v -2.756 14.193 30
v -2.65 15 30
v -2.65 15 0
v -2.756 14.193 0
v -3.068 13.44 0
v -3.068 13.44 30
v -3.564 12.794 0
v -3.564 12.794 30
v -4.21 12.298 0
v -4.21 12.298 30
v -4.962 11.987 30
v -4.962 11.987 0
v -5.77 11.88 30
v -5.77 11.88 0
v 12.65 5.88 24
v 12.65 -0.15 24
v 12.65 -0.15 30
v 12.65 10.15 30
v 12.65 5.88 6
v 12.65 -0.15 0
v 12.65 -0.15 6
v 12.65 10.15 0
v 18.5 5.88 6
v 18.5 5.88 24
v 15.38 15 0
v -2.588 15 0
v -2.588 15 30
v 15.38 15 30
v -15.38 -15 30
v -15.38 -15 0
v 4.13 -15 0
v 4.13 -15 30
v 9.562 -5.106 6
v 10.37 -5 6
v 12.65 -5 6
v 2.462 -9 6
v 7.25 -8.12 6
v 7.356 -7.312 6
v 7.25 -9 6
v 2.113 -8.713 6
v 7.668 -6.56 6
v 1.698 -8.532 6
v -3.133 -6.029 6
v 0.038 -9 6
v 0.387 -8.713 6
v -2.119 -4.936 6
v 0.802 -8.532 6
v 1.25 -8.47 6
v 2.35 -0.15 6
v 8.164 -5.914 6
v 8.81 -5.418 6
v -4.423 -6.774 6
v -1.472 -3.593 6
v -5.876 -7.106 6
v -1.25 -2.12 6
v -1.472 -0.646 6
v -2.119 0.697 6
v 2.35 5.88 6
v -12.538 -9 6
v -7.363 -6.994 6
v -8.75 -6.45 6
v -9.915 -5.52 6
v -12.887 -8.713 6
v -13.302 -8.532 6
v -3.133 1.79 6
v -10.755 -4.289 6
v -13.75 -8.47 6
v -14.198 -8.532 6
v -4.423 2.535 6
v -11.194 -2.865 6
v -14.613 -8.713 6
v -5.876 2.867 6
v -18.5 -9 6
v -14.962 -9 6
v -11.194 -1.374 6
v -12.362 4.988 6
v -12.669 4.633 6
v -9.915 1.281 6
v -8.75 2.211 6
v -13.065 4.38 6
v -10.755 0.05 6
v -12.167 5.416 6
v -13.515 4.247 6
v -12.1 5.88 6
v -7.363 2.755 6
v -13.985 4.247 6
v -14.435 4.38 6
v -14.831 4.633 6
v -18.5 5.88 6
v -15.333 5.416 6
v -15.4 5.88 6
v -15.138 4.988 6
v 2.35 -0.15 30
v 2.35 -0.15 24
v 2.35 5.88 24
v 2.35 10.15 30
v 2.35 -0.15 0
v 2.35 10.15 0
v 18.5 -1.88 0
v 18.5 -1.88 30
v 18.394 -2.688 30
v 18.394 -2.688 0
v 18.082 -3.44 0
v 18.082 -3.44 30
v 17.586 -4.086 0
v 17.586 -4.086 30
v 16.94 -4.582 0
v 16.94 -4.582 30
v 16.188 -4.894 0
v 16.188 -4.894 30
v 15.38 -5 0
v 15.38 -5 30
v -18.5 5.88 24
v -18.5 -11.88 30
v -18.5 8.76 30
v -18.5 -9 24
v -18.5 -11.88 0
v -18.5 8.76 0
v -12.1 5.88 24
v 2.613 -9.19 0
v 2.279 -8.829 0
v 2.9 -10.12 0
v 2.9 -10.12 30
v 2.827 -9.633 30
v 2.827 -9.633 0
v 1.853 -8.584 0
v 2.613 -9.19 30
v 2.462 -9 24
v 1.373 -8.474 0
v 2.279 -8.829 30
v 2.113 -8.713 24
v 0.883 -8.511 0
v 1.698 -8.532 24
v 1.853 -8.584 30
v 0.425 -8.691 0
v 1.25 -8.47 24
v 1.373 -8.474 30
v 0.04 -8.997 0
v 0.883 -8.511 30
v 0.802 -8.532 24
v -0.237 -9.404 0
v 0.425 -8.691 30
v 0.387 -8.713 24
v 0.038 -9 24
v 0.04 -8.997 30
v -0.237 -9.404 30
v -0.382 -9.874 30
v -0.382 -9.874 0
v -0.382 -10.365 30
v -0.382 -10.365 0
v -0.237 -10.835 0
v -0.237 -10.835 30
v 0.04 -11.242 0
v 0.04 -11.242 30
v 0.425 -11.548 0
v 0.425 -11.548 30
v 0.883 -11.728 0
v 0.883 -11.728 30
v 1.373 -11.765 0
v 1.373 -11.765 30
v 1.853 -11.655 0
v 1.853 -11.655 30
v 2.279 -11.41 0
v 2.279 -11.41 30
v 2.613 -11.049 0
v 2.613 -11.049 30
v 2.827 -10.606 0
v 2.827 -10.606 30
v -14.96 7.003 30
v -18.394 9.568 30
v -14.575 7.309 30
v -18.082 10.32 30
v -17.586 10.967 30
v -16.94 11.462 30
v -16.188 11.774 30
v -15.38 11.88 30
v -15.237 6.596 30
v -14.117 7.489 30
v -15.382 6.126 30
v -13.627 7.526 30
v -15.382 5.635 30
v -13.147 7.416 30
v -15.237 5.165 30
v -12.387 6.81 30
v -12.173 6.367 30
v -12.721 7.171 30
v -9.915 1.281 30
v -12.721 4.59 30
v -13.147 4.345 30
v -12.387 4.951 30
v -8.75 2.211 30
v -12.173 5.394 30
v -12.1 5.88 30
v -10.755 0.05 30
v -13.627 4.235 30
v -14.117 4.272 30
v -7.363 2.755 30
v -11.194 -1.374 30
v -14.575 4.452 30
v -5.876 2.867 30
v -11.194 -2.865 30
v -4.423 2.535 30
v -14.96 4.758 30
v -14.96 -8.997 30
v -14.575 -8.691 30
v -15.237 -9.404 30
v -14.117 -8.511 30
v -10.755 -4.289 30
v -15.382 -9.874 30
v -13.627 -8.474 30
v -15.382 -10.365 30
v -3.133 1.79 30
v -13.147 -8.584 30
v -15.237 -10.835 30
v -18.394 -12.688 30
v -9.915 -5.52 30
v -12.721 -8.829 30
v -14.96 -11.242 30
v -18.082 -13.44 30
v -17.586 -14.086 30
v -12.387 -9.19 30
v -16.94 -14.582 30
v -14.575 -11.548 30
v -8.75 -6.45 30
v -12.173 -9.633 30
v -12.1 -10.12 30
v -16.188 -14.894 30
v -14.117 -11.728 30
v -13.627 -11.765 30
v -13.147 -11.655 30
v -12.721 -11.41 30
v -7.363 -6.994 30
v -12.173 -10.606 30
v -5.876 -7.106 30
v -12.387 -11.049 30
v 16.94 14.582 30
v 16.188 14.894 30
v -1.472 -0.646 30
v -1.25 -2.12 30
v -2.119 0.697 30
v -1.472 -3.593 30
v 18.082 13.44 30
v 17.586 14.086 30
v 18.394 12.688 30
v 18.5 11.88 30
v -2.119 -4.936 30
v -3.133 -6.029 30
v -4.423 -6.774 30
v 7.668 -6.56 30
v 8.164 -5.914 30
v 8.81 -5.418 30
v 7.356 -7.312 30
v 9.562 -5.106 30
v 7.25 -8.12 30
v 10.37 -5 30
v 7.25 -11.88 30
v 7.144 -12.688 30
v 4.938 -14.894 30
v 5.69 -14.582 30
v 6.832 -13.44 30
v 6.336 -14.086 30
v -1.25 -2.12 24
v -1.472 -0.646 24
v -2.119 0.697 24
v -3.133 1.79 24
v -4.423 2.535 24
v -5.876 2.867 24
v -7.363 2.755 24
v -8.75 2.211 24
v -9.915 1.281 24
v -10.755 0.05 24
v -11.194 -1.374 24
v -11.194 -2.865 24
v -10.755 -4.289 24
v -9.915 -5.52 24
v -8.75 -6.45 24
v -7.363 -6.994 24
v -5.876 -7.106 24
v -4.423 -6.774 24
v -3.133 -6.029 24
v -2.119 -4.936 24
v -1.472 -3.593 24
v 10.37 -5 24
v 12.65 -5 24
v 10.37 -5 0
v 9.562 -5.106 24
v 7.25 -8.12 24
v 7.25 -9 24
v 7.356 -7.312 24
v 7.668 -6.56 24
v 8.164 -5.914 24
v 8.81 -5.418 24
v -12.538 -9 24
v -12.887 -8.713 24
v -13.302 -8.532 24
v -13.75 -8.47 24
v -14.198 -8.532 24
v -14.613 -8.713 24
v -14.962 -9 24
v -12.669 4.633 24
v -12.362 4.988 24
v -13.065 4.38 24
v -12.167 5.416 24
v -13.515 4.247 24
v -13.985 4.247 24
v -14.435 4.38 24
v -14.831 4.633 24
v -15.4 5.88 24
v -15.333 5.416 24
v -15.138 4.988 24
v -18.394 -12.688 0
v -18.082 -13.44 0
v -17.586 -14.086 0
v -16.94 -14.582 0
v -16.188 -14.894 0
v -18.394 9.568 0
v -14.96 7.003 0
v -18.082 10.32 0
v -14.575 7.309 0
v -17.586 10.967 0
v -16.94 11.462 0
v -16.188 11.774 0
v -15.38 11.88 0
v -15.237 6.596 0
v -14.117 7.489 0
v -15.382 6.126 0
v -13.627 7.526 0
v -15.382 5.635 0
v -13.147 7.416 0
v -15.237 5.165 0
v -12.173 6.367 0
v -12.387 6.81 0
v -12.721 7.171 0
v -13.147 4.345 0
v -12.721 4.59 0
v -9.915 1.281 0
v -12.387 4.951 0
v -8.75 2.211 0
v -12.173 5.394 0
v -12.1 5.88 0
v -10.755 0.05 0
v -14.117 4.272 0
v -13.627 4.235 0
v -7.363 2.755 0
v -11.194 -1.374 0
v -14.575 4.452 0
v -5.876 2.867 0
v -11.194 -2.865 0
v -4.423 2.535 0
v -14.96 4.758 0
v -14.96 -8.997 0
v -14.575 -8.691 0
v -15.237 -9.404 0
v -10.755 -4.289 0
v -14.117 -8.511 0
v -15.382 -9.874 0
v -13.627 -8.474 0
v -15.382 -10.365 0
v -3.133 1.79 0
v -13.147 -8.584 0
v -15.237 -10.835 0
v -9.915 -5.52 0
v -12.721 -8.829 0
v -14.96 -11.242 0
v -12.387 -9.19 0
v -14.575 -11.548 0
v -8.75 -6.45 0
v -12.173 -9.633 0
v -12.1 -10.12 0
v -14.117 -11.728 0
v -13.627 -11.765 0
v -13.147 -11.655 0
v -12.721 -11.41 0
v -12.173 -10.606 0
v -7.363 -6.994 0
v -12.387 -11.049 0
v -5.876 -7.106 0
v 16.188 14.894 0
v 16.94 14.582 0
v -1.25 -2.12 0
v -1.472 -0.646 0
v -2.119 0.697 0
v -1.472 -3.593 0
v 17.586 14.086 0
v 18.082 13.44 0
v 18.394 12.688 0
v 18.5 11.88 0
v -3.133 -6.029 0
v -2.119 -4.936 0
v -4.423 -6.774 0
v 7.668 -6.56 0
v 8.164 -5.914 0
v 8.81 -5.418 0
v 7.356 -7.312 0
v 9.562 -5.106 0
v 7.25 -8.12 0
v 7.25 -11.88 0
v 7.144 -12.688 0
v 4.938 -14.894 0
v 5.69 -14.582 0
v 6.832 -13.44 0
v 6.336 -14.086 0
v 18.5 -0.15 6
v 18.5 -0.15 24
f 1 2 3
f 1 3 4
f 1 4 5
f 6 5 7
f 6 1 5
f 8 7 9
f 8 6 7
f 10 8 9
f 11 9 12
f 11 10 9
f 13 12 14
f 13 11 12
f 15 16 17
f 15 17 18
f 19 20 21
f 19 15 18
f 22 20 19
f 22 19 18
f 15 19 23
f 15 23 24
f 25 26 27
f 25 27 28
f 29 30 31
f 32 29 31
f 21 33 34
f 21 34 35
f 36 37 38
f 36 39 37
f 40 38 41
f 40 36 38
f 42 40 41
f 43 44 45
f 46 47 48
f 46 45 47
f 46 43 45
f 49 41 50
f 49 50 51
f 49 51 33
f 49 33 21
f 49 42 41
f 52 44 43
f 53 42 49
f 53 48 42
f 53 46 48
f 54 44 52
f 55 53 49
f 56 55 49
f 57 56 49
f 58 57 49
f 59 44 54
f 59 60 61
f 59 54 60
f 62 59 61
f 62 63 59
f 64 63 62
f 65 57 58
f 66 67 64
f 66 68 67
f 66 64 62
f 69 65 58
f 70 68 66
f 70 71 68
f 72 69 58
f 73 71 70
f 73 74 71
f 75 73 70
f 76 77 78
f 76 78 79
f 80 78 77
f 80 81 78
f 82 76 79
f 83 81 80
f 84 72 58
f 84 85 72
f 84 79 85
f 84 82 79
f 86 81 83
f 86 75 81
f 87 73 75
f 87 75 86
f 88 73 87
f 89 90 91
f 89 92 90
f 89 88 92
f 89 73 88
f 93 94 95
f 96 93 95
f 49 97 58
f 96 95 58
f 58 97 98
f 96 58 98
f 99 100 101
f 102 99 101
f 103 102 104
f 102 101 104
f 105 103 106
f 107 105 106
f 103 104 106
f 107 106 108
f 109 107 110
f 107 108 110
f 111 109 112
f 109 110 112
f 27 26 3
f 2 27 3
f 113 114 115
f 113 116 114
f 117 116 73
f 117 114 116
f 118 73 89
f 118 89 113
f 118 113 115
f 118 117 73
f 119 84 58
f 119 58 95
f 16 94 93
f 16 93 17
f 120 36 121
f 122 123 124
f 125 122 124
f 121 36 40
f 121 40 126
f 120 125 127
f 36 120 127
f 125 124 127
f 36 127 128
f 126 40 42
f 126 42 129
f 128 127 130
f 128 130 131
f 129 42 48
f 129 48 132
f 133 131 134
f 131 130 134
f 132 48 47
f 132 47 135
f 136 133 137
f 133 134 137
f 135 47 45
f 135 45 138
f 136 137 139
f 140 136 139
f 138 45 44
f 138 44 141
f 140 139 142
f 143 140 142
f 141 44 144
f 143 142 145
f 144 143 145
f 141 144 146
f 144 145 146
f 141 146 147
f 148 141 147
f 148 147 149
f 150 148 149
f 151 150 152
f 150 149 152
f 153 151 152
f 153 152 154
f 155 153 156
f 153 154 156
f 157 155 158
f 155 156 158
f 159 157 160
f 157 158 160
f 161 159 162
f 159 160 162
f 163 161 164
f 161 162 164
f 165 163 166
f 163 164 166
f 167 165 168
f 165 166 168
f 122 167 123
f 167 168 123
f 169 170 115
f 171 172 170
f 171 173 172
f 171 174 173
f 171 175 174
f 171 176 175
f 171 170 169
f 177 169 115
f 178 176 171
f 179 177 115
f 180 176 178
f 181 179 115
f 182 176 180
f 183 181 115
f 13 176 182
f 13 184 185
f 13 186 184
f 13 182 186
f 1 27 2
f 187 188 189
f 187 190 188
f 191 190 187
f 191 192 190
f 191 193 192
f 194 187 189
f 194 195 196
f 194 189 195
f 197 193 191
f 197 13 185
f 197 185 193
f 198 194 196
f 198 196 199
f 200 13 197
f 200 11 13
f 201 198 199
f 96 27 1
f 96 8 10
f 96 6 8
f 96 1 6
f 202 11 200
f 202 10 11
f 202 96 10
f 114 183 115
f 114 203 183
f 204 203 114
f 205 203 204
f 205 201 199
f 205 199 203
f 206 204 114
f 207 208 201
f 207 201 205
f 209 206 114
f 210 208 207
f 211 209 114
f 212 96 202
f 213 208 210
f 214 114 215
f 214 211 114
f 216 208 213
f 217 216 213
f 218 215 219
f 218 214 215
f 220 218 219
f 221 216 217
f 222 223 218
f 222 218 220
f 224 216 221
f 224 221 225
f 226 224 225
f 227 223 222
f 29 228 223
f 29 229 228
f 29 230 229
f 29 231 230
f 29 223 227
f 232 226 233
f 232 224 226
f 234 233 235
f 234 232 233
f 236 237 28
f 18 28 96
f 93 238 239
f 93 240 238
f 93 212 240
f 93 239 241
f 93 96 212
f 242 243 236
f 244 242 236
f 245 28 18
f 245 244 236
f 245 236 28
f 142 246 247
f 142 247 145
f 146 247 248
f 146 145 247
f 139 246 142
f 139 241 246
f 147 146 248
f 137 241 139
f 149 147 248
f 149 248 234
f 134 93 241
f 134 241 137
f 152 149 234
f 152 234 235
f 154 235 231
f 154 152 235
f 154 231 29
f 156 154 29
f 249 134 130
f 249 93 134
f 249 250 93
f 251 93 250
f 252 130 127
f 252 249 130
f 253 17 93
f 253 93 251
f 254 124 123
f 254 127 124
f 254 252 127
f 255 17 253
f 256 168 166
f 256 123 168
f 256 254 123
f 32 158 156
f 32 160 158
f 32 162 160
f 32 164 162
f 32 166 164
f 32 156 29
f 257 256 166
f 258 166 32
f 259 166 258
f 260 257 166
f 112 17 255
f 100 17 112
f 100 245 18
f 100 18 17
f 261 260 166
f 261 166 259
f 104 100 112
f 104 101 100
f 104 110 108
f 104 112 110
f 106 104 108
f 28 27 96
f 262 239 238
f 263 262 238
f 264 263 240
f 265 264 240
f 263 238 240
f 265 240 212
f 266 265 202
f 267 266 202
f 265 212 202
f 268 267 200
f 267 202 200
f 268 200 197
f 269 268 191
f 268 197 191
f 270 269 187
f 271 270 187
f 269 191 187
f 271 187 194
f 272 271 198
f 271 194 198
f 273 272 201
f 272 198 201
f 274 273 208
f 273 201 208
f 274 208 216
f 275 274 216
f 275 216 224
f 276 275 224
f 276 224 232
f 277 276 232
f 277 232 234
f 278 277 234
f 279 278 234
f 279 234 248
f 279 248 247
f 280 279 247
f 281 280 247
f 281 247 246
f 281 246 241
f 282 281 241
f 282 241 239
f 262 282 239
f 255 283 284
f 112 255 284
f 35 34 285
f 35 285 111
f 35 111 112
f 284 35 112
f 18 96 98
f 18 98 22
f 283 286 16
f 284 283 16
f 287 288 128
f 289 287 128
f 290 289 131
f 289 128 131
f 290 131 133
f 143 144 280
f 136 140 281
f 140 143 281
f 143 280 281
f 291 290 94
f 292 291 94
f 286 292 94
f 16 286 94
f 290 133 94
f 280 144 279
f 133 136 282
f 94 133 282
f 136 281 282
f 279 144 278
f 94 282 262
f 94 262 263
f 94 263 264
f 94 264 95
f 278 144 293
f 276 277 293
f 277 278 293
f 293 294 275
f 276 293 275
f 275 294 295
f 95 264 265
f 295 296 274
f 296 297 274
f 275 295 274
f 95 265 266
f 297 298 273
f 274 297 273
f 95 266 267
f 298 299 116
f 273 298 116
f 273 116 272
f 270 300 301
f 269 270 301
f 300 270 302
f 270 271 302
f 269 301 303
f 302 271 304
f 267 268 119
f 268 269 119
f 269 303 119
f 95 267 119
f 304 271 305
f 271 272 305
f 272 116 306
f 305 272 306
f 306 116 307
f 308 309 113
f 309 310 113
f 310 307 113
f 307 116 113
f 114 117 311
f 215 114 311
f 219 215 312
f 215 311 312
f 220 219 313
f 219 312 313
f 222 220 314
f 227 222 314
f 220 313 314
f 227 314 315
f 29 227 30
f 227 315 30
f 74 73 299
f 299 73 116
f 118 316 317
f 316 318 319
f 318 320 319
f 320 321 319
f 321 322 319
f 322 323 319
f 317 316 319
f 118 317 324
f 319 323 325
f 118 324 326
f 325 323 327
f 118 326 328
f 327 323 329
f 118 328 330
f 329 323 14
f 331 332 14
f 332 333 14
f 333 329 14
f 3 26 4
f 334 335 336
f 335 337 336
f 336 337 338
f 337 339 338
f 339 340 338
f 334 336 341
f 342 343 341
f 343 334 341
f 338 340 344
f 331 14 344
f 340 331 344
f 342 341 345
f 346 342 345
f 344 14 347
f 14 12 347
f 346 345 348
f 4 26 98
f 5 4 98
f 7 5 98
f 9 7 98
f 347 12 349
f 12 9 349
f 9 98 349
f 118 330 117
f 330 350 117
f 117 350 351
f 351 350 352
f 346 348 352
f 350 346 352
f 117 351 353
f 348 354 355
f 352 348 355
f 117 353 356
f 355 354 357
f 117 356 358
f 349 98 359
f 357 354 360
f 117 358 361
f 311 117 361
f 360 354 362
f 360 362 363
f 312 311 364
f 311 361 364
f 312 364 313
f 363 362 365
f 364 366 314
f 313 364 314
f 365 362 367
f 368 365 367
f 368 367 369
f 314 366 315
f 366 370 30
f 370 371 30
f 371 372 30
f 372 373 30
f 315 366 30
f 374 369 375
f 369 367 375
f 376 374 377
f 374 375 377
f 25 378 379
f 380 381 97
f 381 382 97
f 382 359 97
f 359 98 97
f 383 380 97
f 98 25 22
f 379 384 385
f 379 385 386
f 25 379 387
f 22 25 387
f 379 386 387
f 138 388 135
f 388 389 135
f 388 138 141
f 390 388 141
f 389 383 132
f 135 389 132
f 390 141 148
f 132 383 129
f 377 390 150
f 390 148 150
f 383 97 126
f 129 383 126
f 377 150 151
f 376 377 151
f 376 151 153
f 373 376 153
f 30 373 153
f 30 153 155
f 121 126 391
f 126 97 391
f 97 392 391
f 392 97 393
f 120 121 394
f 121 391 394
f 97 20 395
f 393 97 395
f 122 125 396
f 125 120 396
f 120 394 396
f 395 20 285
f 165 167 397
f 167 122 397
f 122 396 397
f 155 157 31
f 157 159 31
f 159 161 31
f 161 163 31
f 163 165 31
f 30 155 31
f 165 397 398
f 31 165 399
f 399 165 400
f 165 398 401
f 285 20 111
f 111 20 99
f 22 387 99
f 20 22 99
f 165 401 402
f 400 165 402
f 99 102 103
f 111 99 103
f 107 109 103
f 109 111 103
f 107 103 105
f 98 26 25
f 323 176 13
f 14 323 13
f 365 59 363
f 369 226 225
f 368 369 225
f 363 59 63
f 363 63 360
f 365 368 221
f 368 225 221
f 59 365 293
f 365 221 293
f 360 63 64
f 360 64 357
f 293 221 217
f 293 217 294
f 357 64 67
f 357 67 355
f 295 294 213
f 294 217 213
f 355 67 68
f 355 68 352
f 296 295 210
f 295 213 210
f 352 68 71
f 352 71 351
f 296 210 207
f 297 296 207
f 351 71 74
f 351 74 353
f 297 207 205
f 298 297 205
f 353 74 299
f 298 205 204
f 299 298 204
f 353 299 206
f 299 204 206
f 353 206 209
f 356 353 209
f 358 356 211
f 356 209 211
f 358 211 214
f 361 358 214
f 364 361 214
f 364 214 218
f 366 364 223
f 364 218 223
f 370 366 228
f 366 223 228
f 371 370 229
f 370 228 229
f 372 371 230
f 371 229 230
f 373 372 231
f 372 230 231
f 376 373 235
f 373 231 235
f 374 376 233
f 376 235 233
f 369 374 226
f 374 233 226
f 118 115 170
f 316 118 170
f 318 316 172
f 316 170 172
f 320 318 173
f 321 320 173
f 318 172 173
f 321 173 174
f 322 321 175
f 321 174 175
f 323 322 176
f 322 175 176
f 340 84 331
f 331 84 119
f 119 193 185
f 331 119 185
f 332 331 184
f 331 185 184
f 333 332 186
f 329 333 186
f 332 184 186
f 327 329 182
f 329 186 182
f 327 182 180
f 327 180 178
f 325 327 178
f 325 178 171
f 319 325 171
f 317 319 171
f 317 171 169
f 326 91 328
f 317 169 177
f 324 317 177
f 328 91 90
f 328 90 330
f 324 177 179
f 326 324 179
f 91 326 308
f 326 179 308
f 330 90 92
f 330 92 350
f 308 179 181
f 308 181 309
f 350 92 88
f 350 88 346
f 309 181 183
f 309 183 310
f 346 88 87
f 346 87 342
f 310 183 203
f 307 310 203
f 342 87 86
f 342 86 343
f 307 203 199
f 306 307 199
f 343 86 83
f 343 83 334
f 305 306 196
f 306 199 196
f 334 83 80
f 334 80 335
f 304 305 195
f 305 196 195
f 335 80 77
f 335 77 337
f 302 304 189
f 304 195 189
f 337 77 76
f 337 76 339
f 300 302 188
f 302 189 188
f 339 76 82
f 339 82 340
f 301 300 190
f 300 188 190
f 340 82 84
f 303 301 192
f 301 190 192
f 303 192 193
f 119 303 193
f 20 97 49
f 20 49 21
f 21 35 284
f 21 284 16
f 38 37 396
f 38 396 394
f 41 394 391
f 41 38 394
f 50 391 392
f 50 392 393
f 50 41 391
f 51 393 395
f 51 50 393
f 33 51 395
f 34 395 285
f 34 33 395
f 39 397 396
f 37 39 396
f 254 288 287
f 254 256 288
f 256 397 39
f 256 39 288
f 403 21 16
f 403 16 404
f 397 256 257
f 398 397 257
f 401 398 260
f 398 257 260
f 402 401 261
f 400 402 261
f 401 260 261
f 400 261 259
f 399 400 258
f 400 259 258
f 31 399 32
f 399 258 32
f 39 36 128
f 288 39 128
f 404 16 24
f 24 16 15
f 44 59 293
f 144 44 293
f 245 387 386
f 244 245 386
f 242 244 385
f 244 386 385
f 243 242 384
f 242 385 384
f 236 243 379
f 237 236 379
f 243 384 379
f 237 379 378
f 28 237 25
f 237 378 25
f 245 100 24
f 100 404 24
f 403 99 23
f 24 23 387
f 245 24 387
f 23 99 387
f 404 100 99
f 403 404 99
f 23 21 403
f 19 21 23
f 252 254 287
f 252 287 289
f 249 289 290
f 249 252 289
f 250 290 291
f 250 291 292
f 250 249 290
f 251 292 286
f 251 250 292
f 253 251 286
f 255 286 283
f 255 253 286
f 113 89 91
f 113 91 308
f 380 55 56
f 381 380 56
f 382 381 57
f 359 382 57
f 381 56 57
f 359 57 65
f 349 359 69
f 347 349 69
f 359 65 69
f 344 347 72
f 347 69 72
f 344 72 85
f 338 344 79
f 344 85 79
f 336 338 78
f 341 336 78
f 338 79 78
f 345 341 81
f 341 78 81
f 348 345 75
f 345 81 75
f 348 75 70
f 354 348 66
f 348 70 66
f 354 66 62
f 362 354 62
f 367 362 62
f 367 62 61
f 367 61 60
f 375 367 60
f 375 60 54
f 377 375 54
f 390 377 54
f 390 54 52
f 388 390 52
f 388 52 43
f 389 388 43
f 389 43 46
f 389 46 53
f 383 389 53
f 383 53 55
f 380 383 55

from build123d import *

# Parameters (mm, degrees)
SKETCH_1_W          = 37
SKETCH_1_H          = 30
SKETCH_1_W_2        = 10.3
SKETCH_1_H_2        = 10.3
EXTRUDE_1_DEPTH     = 30
SKETCH_2_R          = 1.65
SKETCH_2_W          = 11.25
SKETCH_2_H          = 10
CUT_EXTRUDE_1_DEPTH = 39.304699451
SKETCH_3_R          = 5
SKETCH_3_W          = 15.85
SKETCH_3_H          = 3.119518618
CUT_EXTRUDE_2_DEPTH = 39.304699451
SKETCH_4_W          = 18
SKETCH_4_H          = 14.880481382
CUT_EXTRUDE_3_DEPTH = 50.939963957
SKETCH_5_W          = 5.85
SKETCH_5_H          = 4.85
EXTRUDE_2_DEPTH     = 18
FILLET_2_R          = 3.12


with BuildPart() as part:
    # 草图1 → 凸台-拉伸1 (new body)
    with BuildSketch(Plane.XY):
        Rectangle(SKETCH_1_W, SKETCH_1_H)
        with Locations((7.5, 5)):
            Rectangle(SKETCH_1_W_2, SKETCH_1_H_2, mode=Mode.SUBTRACT)
    extrude(amount=EXTRUDE_1_DEPTH)

    # 草图2 → 切除-拉伸1 (cut, through all)
    with BuildSketch(Plane.XY.offset(30)):
        with Locations((-13.75, 5.880481382)):
            Circle(SKETCH_2_R)
        with Locations((-13.75, -10.119518618)):
            Circle(SKETCH_2_R)
        with Locations((1.25, -10.119518618)):
            Circle(SKETCH_2_R)
        with Locations((12.875, -10)):
            Rectangle(SKETCH_2_W, SKETCH_2_H)
    extrude(amount=-CUT_EXTRUDE_1_DEPTH, mode=Mode.SUBTRACT)

    # 草图3 → 切除-拉伸2 (cut, through all)
    with BuildSketch(Plane.XY.offset(30)):
        with Locations((-6.25, -2.119518618)):
            Circle(SKETCH_3_R)
        with Locations((-10.575, 13.440240691)):
            Rectangle(SKETCH_3_W, SKETCH_3_H)
    extrude(amount=-CUT_EXTRUDE_2_DEPTH, mode=Mode.SUBTRACT)

    # 草图4 → 切除-拉伸3 (cut, through all)
    with BuildSketch(Plane.ZY.offset(18.5)):
        with Locations((15, -1.559759309)):
            Rectangle(SKETCH_4_W, SKETCH_4_H)
    extrude(amount=-CUT_EXTRUDE_3_DEPTH, mode=Mode.SUBTRACT)

    # 草图5 → 凸台-拉伸2 (add)
    with BuildSketch(Plane.XY.offset(6)):
        with Locations((15.575, -2.575)):
            Rectangle(SKETCH_5_W, SKETCH_5_H)
    extrude(amount=EXTRUDE_2_DEPTH)

    # 圆角2
    # the kernel refuses this fillet: 3.12 mm, written as the material it adds along each edge
    with BuildSketch(Plane(origin=(7.25, -5, 6), x_dir=(0, -1, 0), z_dir=(0, 0, -1)), Plane(origin=(7.25, -5, 30), x_dir=(0, -1, 0), z_dir=(0, 0, -1))) as fillet_2_piece_1:
        with BuildLine():
            CenterArc((FILLET_2_R, -FILLET_2_R), FILLET_2_R, 90, 90)
            Line((0, -FILLET_2_R), (-FILLET_2_R * 0.02, -FILLET_2_R))
            Line((-FILLET_2_R * 0.02, -FILLET_2_R), (-FILLET_2_R * 0.02, FILLET_2_R * 0.02))
            Line((-FILLET_2_R * 0.02, FILLET_2_R * 0.02), (FILLET_2_R, FILLET_2_R * 0.02))
            Line((FILLET_2_R, FILLET_2_R * 0.02), (FILLET_2_R, 0))
        make_face()
    extrude(amount=6)
    with BuildSketch(Plane(origin=(-2.65, 11.880481382, 30), x_dir=(0, 1, 0), z_dir=(0, 0, -1))) as fillet_2_piece_2:
        with BuildLine():
            CenterArc((FILLET_2_R, -FILLET_2_R), FILLET_2_R, 90, 90)
            Line((0, -FILLET_2_R), (-FILLET_2_R * 0.02, -FILLET_2_R))
            Line((-FILLET_2_R * 0.02, -FILLET_2_R), (-FILLET_2_R * 0.02, FILLET_2_R * 0.02))
            Line((-FILLET_2_R * 0.02, FILLET_2_R * 0.02), (FILLET_2_R, FILLET_2_R * 0.02))
            Line((FILLET_2_R, FILLET_2_R * 0.02), (FILLET_2_R, 0))
        make_face()
    extrude(amount=30)
    # the kernel refuses this fillet: 3.12 mm, written as the material it takes off along each edge
    with BuildSketch(Plane(origin=(-18.5, 11.880481382, 30), x_dir=(1, 0, 0), z_dir=(0, 0, -1)), Plane(origin=(18.5, -5, 30), x_dir=(-1, 0, 0), z_dir=(0, 0, -1)), Plane(origin=(7.25, -15, 30), x_dir=(-1, 0, 0), z_dir=(0, 0, -1))) as fillet_2_2_piece_1:
        with BuildLine():
            CenterArc((FILLET_2_R, FILLET_2_R), FILLET_2_R, 180, 90)
            Line((0, FILLET_2_R), (-FILLET_2_R * 0.02, FILLET_2_R))
            Line((-FILLET_2_R * 0.02, FILLET_2_R), (-FILLET_2_R * 0.02, -FILLET_2_R * 0.02))
            Line((-FILLET_2_R * 0.02, -FILLET_2_R * 0.02), (FILLET_2_R, -FILLET_2_R * 0.02))
            Line((FILLET_2_R, -FILLET_2_R * 0.02), (FILLET_2_R, 0))
        make_face()
    extrude(amount=30, mode=Mode.SUBTRACT)
    with BuildSketch(Plane(origin=(18.5, 15, 0), x_dir=(0, -1, 0), z_dir=(0, 0, 1)), Plane(origin=(-18.5, -15, 0), x_dir=(0, 1, 0), z_dir=(0, 0, 1))) as fillet_2_2_piece_2:
        with BuildLine():
            CenterArc((FILLET_2_R, -FILLET_2_R), FILLET_2_R, 90, 90)
            Line((0, -FILLET_2_R), (-FILLET_2_R * 0.02, -FILLET_2_R))
            Line((-FILLET_2_R * 0.02, -FILLET_2_R), (-FILLET_2_R * 0.02, FILLET_2_R * 0.02))
            Line((-FILLET_2_R * 0.02, FILLET_2_R * 0.02), (FILLET_2_R, FILLET_2_R * 0.02))
            Line((FILLET_2_R, FILLET_2_R * 0.02), (FILLET_2_R, 0))
        make_face()
    extrude(amount=30, mode=Mode.SUBTRACT)


solid = part.part
